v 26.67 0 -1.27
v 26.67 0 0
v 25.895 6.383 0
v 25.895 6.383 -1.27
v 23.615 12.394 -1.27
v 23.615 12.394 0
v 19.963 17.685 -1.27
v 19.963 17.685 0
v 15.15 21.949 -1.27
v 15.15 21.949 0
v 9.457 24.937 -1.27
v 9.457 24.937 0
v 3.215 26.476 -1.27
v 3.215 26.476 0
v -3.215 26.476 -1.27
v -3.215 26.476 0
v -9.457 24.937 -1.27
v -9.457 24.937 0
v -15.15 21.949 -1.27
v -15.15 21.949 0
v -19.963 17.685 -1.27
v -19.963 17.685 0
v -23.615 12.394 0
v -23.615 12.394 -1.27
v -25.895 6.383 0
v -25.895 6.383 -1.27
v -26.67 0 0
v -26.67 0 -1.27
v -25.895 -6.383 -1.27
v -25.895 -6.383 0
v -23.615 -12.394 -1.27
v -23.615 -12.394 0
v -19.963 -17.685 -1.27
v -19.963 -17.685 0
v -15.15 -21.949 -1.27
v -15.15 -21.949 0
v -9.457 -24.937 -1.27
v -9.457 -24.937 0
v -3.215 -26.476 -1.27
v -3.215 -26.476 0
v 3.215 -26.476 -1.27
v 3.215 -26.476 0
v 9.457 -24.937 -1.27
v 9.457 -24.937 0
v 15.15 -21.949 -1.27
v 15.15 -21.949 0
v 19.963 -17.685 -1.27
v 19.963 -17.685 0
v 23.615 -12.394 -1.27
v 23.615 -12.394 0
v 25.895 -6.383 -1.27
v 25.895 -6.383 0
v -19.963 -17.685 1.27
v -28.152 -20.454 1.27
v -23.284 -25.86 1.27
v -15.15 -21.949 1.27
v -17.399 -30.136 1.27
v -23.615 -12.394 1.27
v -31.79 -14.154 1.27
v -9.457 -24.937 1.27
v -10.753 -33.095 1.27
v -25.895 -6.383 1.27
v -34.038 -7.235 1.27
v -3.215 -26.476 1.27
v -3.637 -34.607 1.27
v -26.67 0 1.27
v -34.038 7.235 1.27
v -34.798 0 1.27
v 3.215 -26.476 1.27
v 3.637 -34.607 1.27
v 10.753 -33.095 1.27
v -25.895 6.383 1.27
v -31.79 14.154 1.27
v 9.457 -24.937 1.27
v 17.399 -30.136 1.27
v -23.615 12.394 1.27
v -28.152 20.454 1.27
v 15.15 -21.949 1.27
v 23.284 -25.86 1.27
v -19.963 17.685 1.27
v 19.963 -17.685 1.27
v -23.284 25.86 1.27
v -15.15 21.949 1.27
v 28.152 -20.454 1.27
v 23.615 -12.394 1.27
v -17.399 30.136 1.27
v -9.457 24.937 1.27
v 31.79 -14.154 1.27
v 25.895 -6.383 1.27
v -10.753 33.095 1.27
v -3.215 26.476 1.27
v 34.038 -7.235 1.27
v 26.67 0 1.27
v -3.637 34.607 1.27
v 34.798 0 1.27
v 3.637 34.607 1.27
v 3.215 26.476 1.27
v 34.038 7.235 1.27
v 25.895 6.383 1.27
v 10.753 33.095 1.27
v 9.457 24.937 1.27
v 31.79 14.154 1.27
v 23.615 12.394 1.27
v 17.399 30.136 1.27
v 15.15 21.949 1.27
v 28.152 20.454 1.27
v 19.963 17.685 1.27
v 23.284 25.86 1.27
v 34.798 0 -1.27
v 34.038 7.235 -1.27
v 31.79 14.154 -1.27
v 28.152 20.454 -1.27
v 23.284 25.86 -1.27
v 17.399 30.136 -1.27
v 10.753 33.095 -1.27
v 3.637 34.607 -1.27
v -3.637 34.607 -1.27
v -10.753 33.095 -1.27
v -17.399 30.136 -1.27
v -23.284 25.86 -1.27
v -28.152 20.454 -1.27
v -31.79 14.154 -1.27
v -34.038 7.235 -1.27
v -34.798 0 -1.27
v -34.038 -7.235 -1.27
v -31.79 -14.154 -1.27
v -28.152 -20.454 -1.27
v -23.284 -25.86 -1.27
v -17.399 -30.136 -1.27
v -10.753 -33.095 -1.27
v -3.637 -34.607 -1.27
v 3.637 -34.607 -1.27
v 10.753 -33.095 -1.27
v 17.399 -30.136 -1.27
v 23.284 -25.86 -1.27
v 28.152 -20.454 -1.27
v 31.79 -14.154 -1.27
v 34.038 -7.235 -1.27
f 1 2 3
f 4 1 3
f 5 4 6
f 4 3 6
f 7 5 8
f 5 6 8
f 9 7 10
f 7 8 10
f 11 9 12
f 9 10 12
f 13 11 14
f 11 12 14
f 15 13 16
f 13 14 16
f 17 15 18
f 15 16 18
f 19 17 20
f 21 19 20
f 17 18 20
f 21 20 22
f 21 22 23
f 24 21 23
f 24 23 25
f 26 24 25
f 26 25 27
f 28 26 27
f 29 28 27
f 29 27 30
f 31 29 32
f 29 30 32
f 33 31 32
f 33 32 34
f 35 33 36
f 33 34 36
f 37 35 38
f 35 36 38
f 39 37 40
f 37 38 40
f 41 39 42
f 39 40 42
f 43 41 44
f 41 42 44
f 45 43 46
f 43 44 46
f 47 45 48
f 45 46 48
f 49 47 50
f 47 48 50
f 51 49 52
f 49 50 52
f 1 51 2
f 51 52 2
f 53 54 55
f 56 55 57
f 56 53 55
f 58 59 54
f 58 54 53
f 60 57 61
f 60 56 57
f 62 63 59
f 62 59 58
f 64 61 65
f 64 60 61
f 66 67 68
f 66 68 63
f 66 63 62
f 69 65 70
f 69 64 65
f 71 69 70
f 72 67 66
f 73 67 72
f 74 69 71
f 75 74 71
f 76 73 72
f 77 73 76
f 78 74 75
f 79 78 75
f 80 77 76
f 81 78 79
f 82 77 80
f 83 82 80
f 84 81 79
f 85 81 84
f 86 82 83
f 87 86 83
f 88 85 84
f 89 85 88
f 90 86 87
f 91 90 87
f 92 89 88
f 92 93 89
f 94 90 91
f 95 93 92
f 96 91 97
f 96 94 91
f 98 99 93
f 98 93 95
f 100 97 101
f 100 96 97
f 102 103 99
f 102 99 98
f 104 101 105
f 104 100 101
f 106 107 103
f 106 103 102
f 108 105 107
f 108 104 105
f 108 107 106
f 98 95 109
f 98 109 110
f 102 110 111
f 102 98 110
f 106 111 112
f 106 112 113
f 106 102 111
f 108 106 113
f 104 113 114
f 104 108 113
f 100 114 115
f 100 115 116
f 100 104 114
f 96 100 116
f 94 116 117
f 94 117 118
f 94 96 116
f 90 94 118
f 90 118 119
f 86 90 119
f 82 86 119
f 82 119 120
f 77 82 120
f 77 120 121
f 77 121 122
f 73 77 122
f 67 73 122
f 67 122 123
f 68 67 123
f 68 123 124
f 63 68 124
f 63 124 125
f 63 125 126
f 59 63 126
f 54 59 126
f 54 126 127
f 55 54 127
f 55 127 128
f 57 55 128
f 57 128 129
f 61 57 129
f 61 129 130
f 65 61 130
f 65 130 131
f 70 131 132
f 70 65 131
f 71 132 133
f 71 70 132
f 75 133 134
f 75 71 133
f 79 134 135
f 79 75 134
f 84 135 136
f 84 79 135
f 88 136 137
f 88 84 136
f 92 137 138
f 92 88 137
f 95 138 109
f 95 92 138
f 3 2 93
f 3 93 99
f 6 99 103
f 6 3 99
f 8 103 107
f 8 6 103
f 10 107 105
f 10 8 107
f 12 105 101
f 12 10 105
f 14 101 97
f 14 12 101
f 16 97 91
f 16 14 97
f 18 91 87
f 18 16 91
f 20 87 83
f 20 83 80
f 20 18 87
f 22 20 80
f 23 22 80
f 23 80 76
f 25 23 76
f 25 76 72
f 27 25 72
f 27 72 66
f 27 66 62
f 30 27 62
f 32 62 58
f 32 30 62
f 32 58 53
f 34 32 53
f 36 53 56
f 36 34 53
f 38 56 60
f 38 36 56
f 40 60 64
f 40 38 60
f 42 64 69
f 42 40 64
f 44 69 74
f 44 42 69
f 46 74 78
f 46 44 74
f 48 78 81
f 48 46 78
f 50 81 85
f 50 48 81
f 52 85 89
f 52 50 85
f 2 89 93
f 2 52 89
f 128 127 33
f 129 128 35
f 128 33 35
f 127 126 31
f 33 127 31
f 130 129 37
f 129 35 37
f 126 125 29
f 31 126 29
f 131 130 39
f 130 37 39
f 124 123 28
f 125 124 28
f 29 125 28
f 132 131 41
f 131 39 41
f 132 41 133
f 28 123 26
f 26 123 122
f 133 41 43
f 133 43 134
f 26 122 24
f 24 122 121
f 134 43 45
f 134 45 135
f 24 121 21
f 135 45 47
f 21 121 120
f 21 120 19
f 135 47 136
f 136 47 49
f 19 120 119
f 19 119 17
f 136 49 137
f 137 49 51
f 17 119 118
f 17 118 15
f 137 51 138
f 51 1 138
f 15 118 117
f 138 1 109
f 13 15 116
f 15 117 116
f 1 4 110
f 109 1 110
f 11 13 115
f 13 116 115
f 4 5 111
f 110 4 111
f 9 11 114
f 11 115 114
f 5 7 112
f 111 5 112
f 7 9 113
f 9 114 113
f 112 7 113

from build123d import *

# Parameters (mm, degrees)
BOSS_EXTRUDE1_DEPTH      = 1.27
BOSS_EXTRUDE1_DEPTH_BACK = 1.27
SKETCH1_W                = 74.549
SKETCH1_H                = 74.549
SKETCH1_R                = 26.67
SKETCH2_R                = 3.302
CUT_EXTRUDE1_DEPTH       = 53.775262202
MIRROR2_COPY_1_SKETCH_R  = 3.302
MIRROR2_COPY_1_DEPTH     = 53.775262202
MIRROR2_COPY_2_SKETCH_R  = 3.302
MIRROR2_COPY_2_DEPTH     = 53.775262202
SKETCH14_OUTSIDE_W       = 97.642
SKETCH14_OUTSIDE_H       = 97.642
SKETCH14_OUTSIDE_R       = 34.798
CUT_EXTRUDE6_DEPTH       = 53.775262202


with BuildPart() as part:
    # Sketch1 → Boss-Extrude1 (new, two sides: drawn at the far end of the back side and taken through both)
    with BuildSketch(Plane.XY.offset(-BOSS_EXTRUDE1_DEPTH_BACK)):
        Rectangle(SKETCH1_W, SKETCH1_H)
        Circle(SKETCH1_R, mode=Mode.SUBTRACT)
    extrude(amount=BOSS_EXTRUDE1_DEPTH + BOSS_EXTRUDE1_DEPTH_BACK)

    # Sketch2 → Cut-Extrude1 (cut, through all)
    with BuildSketch(Plane.XY.offset(1.27)):
        with Locations((-31.75, 31.75)):
            Circle(SKETCH2_R)
    cut_extrude1 = extrude(amount=-CUT_EXTRUDE1_DEPTH, mode=Mode.SUBTRACT)

    # Mirror1: Cut-Extrude1 across plane
    add(cut_extrude1.mirror(Plane(origin=(0, 0, 0), x_dir=(0, 0, 1), z_dir=(1, 0, 0))), mode=Mode.SUBTRACT)

    # Mirror2 copy 1 sketch → Mirror2 copy 1 (cut, through all)
    with BuildSketch(Plane(origin=(0, 0, 1.27), x_dir=(-1, 0, 0), z_dir=(0, 0, 1))):
        with Locations((-31.75, 31.75)):
            Circle(MIRROR2_COPY_1_SKETCH_R)
    extrude(amount=-MIRROR2_COPY_1_DEPTH, mode=Mode.SUBTRACT)

    # Mirror2 copy 2 sketch → Mirror2 copy 2 (cut, through all)
    with BuildSketch(Plane.XY.offset(1.27)):
        with Locations((-31.75, -31.75)):
            Circle(MIRROR2_COPY_2_SKETCH_R)
    extrude(amount=-MIRROR2_COPY_2_DEPTH, mode=Mode.SUBTRACT)

    # Sketch14 outside → Cut-Extrude6 (cut, through all)
    with BuildSketch(Plane.XY.offset(1.27)):
        Rectangle(SKETCH14_OUTSIDE_W, SKETCH14_OUTSIDE_H)
        Circle(SKETCH14_OUTSIDE_R, mode=Mode.SUBTRACT)
    extrude(amount=-CUT_EXTRUDE6_DEPTH, mode=Mode.SUBTRACT)


solid = part.part
